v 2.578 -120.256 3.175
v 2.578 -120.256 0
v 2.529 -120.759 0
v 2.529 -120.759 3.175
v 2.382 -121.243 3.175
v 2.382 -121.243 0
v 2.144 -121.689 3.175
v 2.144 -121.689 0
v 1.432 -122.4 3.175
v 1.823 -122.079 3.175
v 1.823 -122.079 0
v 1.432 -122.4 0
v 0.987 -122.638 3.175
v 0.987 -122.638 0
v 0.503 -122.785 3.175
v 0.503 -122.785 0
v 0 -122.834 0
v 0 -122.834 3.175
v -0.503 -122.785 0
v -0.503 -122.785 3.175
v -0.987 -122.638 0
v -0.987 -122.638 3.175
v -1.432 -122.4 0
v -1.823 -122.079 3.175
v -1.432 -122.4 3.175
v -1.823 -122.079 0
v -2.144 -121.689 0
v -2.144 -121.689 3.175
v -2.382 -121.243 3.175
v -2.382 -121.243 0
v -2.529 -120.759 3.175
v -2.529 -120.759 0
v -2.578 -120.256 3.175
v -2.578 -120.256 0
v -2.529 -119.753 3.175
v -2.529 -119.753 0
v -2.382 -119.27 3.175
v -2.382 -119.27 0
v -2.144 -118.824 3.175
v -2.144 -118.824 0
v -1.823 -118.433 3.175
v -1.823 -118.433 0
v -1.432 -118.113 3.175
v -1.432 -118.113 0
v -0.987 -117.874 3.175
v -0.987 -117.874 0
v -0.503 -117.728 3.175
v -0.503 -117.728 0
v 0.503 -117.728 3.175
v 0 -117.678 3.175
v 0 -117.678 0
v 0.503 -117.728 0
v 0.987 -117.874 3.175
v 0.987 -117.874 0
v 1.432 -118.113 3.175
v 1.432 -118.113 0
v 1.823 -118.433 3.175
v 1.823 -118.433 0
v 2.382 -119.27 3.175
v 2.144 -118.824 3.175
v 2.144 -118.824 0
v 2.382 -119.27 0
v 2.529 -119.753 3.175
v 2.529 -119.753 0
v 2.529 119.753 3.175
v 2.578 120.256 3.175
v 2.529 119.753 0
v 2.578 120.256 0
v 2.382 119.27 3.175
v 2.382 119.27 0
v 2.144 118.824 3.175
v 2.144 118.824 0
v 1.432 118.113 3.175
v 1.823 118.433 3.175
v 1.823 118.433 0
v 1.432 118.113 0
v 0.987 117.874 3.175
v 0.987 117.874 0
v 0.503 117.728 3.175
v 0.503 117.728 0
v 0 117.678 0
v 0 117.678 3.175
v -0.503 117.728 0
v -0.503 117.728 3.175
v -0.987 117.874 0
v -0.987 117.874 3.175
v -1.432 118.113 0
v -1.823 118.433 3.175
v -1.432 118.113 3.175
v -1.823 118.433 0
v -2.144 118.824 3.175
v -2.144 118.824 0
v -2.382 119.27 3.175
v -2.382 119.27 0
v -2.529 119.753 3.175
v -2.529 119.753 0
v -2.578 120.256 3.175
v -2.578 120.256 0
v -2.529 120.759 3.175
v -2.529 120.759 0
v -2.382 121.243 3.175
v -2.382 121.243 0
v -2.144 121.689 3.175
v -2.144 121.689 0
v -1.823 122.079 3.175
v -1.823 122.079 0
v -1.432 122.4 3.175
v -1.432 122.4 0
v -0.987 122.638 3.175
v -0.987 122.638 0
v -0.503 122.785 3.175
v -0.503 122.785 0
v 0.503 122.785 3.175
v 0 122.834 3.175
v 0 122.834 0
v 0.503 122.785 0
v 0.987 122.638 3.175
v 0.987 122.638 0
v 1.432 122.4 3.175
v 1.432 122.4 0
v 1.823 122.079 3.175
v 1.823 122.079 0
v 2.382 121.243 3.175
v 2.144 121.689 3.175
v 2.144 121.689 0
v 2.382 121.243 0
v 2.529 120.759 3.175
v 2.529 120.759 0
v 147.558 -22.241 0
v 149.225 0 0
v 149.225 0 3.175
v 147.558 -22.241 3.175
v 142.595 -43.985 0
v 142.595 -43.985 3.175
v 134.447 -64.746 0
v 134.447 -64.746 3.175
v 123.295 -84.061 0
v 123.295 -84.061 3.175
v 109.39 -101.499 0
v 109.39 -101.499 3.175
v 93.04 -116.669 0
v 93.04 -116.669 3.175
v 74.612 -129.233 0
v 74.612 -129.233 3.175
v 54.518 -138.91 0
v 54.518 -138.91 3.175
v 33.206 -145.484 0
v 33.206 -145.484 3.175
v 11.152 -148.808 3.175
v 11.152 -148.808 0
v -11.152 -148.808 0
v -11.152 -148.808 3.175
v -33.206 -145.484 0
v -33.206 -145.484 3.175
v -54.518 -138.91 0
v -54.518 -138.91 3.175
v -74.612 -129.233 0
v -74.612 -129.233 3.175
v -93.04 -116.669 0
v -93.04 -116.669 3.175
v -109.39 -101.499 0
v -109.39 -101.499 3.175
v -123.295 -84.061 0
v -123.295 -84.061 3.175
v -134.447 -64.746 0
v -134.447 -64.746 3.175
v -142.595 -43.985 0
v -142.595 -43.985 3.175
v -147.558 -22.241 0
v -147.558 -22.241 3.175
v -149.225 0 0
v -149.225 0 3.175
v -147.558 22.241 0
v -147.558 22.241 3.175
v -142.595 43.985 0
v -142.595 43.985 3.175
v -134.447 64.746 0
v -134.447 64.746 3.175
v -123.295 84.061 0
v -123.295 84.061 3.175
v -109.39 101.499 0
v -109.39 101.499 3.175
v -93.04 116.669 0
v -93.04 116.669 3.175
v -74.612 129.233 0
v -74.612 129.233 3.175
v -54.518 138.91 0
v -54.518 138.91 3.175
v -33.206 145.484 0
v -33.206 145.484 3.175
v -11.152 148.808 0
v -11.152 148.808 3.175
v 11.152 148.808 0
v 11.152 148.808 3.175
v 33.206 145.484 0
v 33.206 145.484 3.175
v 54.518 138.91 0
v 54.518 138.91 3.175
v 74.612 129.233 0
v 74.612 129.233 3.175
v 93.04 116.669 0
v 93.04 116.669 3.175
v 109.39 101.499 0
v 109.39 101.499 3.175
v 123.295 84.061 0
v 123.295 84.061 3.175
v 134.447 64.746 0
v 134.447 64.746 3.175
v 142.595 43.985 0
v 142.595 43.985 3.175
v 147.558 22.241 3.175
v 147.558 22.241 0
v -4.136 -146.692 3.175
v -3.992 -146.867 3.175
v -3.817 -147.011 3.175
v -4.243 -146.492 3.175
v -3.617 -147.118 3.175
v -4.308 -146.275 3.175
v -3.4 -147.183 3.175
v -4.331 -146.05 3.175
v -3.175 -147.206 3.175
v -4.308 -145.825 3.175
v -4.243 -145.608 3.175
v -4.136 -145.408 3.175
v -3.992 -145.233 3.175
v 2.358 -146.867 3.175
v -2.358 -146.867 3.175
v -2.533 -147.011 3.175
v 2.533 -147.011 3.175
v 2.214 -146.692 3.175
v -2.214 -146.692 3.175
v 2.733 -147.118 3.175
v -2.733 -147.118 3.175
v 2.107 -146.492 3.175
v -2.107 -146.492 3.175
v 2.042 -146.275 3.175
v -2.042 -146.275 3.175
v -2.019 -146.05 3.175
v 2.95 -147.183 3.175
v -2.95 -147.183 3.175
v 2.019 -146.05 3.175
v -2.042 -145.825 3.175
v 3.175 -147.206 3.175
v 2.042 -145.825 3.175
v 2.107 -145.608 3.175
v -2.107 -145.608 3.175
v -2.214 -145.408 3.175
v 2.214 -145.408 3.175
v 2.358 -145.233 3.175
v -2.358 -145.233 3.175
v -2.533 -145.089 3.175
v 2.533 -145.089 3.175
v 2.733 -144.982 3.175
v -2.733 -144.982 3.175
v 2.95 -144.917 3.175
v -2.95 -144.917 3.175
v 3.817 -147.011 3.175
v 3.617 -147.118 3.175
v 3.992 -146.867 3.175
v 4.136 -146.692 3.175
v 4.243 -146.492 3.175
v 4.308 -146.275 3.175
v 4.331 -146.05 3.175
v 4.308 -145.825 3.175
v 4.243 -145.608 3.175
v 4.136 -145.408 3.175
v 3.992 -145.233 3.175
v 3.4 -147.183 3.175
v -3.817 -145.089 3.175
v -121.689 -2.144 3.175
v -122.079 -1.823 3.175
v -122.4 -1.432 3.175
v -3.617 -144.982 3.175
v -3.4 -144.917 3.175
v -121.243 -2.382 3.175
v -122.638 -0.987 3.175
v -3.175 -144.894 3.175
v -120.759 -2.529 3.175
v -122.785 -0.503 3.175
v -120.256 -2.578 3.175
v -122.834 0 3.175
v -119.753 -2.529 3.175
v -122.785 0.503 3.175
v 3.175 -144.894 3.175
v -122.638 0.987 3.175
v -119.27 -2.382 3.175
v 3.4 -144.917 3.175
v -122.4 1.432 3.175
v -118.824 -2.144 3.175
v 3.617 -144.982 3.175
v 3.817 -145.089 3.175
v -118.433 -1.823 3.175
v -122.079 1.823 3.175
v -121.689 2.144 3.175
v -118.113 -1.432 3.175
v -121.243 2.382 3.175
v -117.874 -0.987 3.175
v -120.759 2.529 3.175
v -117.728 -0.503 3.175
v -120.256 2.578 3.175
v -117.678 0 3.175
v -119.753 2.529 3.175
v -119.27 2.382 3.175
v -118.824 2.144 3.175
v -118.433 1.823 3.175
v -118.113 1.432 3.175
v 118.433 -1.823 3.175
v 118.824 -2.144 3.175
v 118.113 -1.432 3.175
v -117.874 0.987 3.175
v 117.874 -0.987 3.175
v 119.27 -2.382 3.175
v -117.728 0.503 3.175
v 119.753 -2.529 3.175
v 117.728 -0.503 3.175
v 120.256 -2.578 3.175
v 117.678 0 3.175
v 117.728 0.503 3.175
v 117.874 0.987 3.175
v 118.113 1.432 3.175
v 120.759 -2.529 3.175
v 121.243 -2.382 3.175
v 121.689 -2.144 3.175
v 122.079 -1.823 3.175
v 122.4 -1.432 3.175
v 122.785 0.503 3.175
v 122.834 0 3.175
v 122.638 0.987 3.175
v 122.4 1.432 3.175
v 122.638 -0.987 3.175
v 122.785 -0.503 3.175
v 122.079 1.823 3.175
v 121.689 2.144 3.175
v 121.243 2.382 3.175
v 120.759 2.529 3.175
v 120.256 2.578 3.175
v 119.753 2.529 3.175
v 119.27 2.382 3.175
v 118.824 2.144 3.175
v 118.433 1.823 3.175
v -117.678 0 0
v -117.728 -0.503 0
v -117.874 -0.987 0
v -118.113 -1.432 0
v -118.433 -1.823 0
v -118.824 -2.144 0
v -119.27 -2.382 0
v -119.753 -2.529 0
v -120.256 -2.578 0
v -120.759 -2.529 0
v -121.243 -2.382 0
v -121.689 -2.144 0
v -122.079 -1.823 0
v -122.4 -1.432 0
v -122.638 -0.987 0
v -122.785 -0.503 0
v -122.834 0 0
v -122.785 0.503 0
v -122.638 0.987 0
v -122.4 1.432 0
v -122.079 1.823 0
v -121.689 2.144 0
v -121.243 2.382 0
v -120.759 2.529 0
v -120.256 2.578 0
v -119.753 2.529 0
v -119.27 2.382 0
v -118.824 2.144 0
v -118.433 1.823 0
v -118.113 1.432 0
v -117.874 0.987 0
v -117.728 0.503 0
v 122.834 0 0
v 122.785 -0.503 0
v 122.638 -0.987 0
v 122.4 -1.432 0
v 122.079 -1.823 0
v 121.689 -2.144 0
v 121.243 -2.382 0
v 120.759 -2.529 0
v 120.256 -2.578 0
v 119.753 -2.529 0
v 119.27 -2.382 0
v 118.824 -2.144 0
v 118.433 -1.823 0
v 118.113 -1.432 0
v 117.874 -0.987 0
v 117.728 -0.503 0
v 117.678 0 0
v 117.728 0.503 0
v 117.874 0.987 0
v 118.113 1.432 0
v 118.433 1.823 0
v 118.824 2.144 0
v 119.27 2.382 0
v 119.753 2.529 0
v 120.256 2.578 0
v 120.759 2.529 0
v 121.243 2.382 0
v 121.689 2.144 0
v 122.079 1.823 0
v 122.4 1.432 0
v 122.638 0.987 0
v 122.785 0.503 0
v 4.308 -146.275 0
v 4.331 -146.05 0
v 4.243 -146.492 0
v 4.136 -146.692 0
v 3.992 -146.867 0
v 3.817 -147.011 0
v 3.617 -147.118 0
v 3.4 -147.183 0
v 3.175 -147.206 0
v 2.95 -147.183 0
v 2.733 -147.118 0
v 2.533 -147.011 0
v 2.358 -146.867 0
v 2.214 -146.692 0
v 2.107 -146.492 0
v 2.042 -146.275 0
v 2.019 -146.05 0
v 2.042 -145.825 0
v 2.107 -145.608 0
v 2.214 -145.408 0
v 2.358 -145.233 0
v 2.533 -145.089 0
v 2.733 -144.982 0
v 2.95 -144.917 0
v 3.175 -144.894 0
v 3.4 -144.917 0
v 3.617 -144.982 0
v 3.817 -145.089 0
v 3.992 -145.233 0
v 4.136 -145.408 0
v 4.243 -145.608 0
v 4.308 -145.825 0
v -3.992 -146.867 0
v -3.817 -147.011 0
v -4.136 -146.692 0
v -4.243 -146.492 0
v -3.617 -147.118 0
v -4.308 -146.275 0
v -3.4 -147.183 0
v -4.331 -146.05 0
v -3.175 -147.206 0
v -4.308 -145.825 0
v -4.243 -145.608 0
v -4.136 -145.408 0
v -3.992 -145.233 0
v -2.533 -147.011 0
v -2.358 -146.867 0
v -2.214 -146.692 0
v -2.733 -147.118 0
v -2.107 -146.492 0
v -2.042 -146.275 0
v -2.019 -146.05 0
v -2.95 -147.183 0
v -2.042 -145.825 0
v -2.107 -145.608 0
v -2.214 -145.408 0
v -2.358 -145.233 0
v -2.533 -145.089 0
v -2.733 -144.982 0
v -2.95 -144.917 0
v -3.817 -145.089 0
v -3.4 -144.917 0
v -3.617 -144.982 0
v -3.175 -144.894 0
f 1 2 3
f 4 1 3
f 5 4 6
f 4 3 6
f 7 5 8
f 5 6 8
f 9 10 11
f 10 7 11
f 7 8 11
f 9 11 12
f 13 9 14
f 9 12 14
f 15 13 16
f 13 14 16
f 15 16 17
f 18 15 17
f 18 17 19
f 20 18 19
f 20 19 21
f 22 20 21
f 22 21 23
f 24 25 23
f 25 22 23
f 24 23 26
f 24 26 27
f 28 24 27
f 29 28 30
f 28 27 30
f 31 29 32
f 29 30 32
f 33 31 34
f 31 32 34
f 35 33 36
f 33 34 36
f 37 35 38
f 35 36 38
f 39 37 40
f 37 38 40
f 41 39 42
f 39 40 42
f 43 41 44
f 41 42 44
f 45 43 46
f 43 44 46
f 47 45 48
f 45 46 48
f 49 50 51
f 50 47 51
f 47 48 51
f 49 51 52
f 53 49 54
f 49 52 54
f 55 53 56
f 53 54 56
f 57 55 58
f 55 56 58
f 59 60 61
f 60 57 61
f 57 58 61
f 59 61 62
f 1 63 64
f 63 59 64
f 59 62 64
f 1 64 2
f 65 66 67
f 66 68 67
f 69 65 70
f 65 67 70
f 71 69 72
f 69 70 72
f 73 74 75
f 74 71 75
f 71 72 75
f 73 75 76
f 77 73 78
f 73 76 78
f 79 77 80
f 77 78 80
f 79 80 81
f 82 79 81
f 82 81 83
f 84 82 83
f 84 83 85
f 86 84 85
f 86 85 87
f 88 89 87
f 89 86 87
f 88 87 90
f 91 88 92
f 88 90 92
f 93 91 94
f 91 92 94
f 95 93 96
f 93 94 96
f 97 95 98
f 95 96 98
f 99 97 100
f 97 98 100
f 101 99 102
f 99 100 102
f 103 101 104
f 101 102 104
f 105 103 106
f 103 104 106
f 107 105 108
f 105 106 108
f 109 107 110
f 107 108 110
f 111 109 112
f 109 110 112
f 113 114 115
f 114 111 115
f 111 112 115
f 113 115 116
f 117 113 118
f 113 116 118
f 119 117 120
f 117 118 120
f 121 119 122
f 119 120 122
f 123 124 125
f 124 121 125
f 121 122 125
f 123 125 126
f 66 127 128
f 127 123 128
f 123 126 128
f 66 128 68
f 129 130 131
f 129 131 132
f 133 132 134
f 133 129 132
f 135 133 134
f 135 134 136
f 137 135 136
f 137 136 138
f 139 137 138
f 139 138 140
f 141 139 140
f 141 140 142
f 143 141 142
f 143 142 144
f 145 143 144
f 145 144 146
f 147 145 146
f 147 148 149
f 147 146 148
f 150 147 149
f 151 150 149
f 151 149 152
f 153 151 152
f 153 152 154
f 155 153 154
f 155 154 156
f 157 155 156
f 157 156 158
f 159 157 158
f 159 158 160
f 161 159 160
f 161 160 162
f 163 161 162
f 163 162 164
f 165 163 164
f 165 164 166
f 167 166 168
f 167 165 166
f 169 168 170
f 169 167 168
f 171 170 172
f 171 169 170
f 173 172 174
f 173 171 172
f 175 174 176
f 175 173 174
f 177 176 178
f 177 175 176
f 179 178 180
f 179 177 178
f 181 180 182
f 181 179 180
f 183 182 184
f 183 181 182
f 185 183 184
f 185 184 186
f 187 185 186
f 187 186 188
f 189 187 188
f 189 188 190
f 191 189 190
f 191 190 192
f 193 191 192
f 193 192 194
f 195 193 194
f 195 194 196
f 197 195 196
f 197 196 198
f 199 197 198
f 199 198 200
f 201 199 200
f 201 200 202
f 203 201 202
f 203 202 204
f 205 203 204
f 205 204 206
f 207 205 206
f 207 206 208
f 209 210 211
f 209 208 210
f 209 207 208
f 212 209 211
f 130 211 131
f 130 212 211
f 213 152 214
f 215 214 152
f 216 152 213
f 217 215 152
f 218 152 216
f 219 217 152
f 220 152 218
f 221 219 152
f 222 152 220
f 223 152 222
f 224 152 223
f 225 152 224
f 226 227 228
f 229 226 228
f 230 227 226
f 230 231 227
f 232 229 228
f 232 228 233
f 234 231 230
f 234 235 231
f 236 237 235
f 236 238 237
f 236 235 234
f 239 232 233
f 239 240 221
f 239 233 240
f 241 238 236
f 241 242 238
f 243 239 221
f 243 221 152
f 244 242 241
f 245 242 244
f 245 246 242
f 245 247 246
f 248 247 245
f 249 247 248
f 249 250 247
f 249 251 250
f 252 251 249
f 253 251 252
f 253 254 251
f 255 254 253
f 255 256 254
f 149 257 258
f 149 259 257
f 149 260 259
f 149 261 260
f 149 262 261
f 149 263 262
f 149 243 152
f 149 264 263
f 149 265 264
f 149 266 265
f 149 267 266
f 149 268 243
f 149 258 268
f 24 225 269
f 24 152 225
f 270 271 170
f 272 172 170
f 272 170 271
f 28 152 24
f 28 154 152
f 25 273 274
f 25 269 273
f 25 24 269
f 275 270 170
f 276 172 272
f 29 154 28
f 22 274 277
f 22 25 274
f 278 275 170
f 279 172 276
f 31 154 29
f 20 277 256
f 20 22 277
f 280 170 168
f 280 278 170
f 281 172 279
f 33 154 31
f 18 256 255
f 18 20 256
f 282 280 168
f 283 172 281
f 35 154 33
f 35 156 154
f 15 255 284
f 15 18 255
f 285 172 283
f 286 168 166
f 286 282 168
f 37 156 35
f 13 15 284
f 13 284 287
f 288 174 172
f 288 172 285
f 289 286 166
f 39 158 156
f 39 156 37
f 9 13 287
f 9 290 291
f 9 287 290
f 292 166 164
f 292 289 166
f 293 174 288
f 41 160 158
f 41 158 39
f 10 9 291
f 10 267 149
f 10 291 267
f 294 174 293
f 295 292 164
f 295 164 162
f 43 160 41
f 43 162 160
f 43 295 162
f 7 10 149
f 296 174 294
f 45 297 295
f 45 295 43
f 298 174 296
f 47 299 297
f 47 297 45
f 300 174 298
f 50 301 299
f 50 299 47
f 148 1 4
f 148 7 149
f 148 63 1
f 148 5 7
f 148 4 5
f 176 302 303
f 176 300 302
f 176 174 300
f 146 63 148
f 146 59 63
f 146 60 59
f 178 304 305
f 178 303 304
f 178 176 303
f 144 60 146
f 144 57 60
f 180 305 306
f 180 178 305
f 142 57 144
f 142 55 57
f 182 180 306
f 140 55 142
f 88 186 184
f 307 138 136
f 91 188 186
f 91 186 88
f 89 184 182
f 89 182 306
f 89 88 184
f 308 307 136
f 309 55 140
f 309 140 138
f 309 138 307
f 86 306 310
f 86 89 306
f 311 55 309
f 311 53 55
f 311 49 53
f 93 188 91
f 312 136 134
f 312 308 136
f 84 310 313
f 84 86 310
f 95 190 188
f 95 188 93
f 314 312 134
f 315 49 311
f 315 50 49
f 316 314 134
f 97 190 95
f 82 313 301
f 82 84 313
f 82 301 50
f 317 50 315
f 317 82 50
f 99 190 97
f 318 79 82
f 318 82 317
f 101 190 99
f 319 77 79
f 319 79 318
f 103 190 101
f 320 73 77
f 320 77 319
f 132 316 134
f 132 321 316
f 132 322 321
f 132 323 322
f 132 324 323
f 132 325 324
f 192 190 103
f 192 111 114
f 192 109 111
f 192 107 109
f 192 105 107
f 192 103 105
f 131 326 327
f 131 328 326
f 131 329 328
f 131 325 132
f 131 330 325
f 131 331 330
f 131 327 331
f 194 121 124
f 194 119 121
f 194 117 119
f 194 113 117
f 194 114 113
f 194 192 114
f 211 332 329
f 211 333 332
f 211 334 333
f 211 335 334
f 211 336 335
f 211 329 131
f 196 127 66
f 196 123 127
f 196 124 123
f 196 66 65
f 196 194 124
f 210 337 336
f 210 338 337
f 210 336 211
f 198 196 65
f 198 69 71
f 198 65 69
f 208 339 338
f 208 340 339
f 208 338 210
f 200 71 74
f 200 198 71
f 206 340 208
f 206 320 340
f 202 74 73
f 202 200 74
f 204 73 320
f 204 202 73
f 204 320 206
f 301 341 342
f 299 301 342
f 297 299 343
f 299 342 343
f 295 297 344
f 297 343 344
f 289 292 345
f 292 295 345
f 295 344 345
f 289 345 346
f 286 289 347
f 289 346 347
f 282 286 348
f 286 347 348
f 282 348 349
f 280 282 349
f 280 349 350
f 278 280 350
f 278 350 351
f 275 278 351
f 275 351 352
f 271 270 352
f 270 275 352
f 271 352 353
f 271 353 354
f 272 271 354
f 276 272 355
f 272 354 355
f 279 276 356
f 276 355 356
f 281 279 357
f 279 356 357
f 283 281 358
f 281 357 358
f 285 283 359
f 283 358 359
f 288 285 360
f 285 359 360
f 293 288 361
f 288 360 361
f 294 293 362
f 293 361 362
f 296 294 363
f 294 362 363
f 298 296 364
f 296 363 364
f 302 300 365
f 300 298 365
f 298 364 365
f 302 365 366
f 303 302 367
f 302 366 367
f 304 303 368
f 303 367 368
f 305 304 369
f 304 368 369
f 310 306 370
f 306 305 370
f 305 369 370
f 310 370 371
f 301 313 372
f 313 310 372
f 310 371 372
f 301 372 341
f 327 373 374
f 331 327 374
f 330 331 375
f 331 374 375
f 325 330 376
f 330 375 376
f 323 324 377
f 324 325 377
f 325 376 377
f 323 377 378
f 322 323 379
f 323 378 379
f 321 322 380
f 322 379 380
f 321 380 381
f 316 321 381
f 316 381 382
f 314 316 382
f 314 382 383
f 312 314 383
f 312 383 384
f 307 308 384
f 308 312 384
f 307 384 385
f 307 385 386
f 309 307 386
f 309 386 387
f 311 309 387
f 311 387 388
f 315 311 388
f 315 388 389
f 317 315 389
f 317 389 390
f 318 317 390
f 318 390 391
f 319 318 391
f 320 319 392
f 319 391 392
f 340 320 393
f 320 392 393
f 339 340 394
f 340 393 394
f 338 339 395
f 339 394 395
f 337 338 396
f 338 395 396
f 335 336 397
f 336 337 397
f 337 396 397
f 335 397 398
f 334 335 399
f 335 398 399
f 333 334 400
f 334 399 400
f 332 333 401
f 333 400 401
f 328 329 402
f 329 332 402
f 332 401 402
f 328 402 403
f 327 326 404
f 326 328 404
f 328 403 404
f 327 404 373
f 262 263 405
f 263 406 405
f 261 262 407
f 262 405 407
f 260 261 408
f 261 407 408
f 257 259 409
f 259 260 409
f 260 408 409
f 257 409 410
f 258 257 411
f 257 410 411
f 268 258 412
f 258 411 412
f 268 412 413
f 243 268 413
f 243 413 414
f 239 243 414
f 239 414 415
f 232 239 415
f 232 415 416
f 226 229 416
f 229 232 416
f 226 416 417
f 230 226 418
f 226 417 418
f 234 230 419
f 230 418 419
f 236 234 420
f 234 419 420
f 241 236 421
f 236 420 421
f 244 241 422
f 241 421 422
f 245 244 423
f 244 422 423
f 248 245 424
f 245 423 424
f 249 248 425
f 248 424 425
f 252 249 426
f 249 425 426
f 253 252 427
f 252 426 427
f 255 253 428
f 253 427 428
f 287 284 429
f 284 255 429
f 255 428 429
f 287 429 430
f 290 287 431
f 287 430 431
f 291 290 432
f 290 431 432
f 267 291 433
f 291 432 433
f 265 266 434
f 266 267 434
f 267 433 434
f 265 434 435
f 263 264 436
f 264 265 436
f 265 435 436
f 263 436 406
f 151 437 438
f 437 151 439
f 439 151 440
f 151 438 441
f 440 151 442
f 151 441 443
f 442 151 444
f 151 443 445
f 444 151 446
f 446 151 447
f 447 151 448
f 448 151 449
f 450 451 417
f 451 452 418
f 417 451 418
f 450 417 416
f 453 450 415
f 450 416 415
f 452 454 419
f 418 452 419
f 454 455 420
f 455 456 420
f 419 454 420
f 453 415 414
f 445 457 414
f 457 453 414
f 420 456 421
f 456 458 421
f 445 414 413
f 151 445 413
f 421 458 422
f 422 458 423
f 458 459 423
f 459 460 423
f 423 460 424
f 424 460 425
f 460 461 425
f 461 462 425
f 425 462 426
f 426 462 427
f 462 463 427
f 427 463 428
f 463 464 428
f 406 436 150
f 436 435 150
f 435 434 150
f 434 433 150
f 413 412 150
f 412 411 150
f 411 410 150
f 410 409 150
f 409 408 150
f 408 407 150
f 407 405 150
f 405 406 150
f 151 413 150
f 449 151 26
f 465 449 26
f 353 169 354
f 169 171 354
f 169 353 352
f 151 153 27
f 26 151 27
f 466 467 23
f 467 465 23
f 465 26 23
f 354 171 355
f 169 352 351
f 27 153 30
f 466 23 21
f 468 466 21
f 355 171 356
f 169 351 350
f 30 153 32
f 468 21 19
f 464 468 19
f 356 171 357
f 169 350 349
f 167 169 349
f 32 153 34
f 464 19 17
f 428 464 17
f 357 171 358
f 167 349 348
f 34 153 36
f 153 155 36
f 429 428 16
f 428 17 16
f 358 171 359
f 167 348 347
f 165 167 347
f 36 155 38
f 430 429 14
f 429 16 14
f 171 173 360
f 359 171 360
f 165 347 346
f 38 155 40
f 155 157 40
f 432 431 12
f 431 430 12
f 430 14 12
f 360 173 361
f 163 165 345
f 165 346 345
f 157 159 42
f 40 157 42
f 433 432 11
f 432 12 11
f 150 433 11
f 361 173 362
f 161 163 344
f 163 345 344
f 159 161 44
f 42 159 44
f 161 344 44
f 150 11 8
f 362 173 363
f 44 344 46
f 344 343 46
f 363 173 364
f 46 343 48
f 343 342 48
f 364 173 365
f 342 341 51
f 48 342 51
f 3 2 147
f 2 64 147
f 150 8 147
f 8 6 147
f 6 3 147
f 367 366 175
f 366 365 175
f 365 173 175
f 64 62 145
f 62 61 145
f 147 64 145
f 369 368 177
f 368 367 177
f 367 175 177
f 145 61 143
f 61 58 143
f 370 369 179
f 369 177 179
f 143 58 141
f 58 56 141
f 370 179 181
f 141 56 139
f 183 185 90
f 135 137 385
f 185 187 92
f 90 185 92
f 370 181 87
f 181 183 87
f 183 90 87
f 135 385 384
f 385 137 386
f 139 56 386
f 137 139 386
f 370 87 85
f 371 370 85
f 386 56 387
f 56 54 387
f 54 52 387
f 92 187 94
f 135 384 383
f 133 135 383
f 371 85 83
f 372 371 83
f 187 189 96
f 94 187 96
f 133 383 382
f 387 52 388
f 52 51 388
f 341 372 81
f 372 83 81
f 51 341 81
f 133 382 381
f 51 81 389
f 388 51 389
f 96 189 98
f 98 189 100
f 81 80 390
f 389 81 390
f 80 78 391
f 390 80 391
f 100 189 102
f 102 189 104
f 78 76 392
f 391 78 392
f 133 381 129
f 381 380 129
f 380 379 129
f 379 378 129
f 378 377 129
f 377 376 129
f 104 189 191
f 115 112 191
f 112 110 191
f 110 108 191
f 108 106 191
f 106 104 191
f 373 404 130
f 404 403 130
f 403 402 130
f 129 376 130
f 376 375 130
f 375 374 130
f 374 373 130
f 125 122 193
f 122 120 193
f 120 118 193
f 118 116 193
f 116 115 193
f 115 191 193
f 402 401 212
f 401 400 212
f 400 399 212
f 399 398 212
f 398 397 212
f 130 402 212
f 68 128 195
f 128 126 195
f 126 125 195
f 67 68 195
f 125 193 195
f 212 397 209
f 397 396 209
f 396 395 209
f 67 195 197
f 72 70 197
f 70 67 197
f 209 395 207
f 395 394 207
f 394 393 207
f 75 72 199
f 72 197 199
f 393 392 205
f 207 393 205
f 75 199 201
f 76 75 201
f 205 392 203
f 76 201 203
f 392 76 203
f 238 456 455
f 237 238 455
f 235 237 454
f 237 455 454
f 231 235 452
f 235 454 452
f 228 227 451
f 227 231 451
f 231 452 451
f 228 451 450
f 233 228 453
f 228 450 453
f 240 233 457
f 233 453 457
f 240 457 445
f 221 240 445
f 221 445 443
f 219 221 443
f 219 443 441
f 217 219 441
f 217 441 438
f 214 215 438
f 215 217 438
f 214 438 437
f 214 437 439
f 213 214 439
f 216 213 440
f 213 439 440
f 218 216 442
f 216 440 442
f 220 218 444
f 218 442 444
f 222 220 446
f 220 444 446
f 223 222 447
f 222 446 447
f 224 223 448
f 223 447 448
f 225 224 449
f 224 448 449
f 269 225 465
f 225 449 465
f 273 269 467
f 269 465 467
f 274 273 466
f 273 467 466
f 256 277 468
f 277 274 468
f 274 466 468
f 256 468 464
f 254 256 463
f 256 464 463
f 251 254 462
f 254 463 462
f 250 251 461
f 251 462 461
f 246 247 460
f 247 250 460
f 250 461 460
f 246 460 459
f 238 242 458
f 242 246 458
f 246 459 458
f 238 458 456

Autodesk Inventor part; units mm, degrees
ref_plane "YZ Plane" through (0, 0, 0) normal (1, 0, 0) x (0, 1, 0)
ref_plane "XZ Plane" through (0, 0, 0) normal (0, 1, 0) x (-1, 0, 0)
ref_plane "XY Plane" through (0, 0, 0) normal (0, 0, 1) x (1, 0, 0)
sketch "Sketch1" plane through (0, 0, 0) normal (0, 0, 1) x (1, 0, 0)
  circle A0 centre (0, 0) radius 149.225
  circle A1 centre (0, 0) radius 120.2563 construction
  circle A2 centre (120.2563, 0) radius 2.5781
  circle A3 centre (0, 120.2563) radius 2.5781
  circle A4 centre (-120.2563, 0) radius 2.5781
  circle A5 centre (0, -120.2563) radius 2.5781
  line L0 (120.2563, 0) -> (0, 0) construction
  line L1 (0, 0) -> (0, 120.2563) construction
  line L2 (0, 0) -> (0, -120.2563) construction
  line L3 (0, 0) -> (-120.2563, 0) construction
  circle A6 centre (3.175, -146.05) radius 1.1557
  circle A7 centre (-3.175, -146.05) radius 1.1557
  line L4 (0, -120.2563) -> (0, -149.225) construction
  line L5 (3.175, -146.05) -> (0, -146.05) construction
  line L6 (0, -146.05) -> (-3.175, -146.05) construction
  dimension "d0" = 298.45
  dimension "d1" = 240.5126
  dimension "d2" = 5.1562
  dimension "d3" = 5.1562
  dimension "d4" = 5.1562
  dimension "d5" = 5.1562
  dimension "d8" = 2.3114
  dimension "d9" = 2.3114
  dimension "d10" = 146.05
  dimension "d11" = 3.175
extrude "Extrusion1" add sketch "Sketch1" along normal blind 3.175 contours A0 | A6 | A7
extrude "Extrusion2" cut sketch "Sketch1" along normal blind 3.175 contours A6 | A7
properties part number "roundplate" material "Aluminum 6061"
